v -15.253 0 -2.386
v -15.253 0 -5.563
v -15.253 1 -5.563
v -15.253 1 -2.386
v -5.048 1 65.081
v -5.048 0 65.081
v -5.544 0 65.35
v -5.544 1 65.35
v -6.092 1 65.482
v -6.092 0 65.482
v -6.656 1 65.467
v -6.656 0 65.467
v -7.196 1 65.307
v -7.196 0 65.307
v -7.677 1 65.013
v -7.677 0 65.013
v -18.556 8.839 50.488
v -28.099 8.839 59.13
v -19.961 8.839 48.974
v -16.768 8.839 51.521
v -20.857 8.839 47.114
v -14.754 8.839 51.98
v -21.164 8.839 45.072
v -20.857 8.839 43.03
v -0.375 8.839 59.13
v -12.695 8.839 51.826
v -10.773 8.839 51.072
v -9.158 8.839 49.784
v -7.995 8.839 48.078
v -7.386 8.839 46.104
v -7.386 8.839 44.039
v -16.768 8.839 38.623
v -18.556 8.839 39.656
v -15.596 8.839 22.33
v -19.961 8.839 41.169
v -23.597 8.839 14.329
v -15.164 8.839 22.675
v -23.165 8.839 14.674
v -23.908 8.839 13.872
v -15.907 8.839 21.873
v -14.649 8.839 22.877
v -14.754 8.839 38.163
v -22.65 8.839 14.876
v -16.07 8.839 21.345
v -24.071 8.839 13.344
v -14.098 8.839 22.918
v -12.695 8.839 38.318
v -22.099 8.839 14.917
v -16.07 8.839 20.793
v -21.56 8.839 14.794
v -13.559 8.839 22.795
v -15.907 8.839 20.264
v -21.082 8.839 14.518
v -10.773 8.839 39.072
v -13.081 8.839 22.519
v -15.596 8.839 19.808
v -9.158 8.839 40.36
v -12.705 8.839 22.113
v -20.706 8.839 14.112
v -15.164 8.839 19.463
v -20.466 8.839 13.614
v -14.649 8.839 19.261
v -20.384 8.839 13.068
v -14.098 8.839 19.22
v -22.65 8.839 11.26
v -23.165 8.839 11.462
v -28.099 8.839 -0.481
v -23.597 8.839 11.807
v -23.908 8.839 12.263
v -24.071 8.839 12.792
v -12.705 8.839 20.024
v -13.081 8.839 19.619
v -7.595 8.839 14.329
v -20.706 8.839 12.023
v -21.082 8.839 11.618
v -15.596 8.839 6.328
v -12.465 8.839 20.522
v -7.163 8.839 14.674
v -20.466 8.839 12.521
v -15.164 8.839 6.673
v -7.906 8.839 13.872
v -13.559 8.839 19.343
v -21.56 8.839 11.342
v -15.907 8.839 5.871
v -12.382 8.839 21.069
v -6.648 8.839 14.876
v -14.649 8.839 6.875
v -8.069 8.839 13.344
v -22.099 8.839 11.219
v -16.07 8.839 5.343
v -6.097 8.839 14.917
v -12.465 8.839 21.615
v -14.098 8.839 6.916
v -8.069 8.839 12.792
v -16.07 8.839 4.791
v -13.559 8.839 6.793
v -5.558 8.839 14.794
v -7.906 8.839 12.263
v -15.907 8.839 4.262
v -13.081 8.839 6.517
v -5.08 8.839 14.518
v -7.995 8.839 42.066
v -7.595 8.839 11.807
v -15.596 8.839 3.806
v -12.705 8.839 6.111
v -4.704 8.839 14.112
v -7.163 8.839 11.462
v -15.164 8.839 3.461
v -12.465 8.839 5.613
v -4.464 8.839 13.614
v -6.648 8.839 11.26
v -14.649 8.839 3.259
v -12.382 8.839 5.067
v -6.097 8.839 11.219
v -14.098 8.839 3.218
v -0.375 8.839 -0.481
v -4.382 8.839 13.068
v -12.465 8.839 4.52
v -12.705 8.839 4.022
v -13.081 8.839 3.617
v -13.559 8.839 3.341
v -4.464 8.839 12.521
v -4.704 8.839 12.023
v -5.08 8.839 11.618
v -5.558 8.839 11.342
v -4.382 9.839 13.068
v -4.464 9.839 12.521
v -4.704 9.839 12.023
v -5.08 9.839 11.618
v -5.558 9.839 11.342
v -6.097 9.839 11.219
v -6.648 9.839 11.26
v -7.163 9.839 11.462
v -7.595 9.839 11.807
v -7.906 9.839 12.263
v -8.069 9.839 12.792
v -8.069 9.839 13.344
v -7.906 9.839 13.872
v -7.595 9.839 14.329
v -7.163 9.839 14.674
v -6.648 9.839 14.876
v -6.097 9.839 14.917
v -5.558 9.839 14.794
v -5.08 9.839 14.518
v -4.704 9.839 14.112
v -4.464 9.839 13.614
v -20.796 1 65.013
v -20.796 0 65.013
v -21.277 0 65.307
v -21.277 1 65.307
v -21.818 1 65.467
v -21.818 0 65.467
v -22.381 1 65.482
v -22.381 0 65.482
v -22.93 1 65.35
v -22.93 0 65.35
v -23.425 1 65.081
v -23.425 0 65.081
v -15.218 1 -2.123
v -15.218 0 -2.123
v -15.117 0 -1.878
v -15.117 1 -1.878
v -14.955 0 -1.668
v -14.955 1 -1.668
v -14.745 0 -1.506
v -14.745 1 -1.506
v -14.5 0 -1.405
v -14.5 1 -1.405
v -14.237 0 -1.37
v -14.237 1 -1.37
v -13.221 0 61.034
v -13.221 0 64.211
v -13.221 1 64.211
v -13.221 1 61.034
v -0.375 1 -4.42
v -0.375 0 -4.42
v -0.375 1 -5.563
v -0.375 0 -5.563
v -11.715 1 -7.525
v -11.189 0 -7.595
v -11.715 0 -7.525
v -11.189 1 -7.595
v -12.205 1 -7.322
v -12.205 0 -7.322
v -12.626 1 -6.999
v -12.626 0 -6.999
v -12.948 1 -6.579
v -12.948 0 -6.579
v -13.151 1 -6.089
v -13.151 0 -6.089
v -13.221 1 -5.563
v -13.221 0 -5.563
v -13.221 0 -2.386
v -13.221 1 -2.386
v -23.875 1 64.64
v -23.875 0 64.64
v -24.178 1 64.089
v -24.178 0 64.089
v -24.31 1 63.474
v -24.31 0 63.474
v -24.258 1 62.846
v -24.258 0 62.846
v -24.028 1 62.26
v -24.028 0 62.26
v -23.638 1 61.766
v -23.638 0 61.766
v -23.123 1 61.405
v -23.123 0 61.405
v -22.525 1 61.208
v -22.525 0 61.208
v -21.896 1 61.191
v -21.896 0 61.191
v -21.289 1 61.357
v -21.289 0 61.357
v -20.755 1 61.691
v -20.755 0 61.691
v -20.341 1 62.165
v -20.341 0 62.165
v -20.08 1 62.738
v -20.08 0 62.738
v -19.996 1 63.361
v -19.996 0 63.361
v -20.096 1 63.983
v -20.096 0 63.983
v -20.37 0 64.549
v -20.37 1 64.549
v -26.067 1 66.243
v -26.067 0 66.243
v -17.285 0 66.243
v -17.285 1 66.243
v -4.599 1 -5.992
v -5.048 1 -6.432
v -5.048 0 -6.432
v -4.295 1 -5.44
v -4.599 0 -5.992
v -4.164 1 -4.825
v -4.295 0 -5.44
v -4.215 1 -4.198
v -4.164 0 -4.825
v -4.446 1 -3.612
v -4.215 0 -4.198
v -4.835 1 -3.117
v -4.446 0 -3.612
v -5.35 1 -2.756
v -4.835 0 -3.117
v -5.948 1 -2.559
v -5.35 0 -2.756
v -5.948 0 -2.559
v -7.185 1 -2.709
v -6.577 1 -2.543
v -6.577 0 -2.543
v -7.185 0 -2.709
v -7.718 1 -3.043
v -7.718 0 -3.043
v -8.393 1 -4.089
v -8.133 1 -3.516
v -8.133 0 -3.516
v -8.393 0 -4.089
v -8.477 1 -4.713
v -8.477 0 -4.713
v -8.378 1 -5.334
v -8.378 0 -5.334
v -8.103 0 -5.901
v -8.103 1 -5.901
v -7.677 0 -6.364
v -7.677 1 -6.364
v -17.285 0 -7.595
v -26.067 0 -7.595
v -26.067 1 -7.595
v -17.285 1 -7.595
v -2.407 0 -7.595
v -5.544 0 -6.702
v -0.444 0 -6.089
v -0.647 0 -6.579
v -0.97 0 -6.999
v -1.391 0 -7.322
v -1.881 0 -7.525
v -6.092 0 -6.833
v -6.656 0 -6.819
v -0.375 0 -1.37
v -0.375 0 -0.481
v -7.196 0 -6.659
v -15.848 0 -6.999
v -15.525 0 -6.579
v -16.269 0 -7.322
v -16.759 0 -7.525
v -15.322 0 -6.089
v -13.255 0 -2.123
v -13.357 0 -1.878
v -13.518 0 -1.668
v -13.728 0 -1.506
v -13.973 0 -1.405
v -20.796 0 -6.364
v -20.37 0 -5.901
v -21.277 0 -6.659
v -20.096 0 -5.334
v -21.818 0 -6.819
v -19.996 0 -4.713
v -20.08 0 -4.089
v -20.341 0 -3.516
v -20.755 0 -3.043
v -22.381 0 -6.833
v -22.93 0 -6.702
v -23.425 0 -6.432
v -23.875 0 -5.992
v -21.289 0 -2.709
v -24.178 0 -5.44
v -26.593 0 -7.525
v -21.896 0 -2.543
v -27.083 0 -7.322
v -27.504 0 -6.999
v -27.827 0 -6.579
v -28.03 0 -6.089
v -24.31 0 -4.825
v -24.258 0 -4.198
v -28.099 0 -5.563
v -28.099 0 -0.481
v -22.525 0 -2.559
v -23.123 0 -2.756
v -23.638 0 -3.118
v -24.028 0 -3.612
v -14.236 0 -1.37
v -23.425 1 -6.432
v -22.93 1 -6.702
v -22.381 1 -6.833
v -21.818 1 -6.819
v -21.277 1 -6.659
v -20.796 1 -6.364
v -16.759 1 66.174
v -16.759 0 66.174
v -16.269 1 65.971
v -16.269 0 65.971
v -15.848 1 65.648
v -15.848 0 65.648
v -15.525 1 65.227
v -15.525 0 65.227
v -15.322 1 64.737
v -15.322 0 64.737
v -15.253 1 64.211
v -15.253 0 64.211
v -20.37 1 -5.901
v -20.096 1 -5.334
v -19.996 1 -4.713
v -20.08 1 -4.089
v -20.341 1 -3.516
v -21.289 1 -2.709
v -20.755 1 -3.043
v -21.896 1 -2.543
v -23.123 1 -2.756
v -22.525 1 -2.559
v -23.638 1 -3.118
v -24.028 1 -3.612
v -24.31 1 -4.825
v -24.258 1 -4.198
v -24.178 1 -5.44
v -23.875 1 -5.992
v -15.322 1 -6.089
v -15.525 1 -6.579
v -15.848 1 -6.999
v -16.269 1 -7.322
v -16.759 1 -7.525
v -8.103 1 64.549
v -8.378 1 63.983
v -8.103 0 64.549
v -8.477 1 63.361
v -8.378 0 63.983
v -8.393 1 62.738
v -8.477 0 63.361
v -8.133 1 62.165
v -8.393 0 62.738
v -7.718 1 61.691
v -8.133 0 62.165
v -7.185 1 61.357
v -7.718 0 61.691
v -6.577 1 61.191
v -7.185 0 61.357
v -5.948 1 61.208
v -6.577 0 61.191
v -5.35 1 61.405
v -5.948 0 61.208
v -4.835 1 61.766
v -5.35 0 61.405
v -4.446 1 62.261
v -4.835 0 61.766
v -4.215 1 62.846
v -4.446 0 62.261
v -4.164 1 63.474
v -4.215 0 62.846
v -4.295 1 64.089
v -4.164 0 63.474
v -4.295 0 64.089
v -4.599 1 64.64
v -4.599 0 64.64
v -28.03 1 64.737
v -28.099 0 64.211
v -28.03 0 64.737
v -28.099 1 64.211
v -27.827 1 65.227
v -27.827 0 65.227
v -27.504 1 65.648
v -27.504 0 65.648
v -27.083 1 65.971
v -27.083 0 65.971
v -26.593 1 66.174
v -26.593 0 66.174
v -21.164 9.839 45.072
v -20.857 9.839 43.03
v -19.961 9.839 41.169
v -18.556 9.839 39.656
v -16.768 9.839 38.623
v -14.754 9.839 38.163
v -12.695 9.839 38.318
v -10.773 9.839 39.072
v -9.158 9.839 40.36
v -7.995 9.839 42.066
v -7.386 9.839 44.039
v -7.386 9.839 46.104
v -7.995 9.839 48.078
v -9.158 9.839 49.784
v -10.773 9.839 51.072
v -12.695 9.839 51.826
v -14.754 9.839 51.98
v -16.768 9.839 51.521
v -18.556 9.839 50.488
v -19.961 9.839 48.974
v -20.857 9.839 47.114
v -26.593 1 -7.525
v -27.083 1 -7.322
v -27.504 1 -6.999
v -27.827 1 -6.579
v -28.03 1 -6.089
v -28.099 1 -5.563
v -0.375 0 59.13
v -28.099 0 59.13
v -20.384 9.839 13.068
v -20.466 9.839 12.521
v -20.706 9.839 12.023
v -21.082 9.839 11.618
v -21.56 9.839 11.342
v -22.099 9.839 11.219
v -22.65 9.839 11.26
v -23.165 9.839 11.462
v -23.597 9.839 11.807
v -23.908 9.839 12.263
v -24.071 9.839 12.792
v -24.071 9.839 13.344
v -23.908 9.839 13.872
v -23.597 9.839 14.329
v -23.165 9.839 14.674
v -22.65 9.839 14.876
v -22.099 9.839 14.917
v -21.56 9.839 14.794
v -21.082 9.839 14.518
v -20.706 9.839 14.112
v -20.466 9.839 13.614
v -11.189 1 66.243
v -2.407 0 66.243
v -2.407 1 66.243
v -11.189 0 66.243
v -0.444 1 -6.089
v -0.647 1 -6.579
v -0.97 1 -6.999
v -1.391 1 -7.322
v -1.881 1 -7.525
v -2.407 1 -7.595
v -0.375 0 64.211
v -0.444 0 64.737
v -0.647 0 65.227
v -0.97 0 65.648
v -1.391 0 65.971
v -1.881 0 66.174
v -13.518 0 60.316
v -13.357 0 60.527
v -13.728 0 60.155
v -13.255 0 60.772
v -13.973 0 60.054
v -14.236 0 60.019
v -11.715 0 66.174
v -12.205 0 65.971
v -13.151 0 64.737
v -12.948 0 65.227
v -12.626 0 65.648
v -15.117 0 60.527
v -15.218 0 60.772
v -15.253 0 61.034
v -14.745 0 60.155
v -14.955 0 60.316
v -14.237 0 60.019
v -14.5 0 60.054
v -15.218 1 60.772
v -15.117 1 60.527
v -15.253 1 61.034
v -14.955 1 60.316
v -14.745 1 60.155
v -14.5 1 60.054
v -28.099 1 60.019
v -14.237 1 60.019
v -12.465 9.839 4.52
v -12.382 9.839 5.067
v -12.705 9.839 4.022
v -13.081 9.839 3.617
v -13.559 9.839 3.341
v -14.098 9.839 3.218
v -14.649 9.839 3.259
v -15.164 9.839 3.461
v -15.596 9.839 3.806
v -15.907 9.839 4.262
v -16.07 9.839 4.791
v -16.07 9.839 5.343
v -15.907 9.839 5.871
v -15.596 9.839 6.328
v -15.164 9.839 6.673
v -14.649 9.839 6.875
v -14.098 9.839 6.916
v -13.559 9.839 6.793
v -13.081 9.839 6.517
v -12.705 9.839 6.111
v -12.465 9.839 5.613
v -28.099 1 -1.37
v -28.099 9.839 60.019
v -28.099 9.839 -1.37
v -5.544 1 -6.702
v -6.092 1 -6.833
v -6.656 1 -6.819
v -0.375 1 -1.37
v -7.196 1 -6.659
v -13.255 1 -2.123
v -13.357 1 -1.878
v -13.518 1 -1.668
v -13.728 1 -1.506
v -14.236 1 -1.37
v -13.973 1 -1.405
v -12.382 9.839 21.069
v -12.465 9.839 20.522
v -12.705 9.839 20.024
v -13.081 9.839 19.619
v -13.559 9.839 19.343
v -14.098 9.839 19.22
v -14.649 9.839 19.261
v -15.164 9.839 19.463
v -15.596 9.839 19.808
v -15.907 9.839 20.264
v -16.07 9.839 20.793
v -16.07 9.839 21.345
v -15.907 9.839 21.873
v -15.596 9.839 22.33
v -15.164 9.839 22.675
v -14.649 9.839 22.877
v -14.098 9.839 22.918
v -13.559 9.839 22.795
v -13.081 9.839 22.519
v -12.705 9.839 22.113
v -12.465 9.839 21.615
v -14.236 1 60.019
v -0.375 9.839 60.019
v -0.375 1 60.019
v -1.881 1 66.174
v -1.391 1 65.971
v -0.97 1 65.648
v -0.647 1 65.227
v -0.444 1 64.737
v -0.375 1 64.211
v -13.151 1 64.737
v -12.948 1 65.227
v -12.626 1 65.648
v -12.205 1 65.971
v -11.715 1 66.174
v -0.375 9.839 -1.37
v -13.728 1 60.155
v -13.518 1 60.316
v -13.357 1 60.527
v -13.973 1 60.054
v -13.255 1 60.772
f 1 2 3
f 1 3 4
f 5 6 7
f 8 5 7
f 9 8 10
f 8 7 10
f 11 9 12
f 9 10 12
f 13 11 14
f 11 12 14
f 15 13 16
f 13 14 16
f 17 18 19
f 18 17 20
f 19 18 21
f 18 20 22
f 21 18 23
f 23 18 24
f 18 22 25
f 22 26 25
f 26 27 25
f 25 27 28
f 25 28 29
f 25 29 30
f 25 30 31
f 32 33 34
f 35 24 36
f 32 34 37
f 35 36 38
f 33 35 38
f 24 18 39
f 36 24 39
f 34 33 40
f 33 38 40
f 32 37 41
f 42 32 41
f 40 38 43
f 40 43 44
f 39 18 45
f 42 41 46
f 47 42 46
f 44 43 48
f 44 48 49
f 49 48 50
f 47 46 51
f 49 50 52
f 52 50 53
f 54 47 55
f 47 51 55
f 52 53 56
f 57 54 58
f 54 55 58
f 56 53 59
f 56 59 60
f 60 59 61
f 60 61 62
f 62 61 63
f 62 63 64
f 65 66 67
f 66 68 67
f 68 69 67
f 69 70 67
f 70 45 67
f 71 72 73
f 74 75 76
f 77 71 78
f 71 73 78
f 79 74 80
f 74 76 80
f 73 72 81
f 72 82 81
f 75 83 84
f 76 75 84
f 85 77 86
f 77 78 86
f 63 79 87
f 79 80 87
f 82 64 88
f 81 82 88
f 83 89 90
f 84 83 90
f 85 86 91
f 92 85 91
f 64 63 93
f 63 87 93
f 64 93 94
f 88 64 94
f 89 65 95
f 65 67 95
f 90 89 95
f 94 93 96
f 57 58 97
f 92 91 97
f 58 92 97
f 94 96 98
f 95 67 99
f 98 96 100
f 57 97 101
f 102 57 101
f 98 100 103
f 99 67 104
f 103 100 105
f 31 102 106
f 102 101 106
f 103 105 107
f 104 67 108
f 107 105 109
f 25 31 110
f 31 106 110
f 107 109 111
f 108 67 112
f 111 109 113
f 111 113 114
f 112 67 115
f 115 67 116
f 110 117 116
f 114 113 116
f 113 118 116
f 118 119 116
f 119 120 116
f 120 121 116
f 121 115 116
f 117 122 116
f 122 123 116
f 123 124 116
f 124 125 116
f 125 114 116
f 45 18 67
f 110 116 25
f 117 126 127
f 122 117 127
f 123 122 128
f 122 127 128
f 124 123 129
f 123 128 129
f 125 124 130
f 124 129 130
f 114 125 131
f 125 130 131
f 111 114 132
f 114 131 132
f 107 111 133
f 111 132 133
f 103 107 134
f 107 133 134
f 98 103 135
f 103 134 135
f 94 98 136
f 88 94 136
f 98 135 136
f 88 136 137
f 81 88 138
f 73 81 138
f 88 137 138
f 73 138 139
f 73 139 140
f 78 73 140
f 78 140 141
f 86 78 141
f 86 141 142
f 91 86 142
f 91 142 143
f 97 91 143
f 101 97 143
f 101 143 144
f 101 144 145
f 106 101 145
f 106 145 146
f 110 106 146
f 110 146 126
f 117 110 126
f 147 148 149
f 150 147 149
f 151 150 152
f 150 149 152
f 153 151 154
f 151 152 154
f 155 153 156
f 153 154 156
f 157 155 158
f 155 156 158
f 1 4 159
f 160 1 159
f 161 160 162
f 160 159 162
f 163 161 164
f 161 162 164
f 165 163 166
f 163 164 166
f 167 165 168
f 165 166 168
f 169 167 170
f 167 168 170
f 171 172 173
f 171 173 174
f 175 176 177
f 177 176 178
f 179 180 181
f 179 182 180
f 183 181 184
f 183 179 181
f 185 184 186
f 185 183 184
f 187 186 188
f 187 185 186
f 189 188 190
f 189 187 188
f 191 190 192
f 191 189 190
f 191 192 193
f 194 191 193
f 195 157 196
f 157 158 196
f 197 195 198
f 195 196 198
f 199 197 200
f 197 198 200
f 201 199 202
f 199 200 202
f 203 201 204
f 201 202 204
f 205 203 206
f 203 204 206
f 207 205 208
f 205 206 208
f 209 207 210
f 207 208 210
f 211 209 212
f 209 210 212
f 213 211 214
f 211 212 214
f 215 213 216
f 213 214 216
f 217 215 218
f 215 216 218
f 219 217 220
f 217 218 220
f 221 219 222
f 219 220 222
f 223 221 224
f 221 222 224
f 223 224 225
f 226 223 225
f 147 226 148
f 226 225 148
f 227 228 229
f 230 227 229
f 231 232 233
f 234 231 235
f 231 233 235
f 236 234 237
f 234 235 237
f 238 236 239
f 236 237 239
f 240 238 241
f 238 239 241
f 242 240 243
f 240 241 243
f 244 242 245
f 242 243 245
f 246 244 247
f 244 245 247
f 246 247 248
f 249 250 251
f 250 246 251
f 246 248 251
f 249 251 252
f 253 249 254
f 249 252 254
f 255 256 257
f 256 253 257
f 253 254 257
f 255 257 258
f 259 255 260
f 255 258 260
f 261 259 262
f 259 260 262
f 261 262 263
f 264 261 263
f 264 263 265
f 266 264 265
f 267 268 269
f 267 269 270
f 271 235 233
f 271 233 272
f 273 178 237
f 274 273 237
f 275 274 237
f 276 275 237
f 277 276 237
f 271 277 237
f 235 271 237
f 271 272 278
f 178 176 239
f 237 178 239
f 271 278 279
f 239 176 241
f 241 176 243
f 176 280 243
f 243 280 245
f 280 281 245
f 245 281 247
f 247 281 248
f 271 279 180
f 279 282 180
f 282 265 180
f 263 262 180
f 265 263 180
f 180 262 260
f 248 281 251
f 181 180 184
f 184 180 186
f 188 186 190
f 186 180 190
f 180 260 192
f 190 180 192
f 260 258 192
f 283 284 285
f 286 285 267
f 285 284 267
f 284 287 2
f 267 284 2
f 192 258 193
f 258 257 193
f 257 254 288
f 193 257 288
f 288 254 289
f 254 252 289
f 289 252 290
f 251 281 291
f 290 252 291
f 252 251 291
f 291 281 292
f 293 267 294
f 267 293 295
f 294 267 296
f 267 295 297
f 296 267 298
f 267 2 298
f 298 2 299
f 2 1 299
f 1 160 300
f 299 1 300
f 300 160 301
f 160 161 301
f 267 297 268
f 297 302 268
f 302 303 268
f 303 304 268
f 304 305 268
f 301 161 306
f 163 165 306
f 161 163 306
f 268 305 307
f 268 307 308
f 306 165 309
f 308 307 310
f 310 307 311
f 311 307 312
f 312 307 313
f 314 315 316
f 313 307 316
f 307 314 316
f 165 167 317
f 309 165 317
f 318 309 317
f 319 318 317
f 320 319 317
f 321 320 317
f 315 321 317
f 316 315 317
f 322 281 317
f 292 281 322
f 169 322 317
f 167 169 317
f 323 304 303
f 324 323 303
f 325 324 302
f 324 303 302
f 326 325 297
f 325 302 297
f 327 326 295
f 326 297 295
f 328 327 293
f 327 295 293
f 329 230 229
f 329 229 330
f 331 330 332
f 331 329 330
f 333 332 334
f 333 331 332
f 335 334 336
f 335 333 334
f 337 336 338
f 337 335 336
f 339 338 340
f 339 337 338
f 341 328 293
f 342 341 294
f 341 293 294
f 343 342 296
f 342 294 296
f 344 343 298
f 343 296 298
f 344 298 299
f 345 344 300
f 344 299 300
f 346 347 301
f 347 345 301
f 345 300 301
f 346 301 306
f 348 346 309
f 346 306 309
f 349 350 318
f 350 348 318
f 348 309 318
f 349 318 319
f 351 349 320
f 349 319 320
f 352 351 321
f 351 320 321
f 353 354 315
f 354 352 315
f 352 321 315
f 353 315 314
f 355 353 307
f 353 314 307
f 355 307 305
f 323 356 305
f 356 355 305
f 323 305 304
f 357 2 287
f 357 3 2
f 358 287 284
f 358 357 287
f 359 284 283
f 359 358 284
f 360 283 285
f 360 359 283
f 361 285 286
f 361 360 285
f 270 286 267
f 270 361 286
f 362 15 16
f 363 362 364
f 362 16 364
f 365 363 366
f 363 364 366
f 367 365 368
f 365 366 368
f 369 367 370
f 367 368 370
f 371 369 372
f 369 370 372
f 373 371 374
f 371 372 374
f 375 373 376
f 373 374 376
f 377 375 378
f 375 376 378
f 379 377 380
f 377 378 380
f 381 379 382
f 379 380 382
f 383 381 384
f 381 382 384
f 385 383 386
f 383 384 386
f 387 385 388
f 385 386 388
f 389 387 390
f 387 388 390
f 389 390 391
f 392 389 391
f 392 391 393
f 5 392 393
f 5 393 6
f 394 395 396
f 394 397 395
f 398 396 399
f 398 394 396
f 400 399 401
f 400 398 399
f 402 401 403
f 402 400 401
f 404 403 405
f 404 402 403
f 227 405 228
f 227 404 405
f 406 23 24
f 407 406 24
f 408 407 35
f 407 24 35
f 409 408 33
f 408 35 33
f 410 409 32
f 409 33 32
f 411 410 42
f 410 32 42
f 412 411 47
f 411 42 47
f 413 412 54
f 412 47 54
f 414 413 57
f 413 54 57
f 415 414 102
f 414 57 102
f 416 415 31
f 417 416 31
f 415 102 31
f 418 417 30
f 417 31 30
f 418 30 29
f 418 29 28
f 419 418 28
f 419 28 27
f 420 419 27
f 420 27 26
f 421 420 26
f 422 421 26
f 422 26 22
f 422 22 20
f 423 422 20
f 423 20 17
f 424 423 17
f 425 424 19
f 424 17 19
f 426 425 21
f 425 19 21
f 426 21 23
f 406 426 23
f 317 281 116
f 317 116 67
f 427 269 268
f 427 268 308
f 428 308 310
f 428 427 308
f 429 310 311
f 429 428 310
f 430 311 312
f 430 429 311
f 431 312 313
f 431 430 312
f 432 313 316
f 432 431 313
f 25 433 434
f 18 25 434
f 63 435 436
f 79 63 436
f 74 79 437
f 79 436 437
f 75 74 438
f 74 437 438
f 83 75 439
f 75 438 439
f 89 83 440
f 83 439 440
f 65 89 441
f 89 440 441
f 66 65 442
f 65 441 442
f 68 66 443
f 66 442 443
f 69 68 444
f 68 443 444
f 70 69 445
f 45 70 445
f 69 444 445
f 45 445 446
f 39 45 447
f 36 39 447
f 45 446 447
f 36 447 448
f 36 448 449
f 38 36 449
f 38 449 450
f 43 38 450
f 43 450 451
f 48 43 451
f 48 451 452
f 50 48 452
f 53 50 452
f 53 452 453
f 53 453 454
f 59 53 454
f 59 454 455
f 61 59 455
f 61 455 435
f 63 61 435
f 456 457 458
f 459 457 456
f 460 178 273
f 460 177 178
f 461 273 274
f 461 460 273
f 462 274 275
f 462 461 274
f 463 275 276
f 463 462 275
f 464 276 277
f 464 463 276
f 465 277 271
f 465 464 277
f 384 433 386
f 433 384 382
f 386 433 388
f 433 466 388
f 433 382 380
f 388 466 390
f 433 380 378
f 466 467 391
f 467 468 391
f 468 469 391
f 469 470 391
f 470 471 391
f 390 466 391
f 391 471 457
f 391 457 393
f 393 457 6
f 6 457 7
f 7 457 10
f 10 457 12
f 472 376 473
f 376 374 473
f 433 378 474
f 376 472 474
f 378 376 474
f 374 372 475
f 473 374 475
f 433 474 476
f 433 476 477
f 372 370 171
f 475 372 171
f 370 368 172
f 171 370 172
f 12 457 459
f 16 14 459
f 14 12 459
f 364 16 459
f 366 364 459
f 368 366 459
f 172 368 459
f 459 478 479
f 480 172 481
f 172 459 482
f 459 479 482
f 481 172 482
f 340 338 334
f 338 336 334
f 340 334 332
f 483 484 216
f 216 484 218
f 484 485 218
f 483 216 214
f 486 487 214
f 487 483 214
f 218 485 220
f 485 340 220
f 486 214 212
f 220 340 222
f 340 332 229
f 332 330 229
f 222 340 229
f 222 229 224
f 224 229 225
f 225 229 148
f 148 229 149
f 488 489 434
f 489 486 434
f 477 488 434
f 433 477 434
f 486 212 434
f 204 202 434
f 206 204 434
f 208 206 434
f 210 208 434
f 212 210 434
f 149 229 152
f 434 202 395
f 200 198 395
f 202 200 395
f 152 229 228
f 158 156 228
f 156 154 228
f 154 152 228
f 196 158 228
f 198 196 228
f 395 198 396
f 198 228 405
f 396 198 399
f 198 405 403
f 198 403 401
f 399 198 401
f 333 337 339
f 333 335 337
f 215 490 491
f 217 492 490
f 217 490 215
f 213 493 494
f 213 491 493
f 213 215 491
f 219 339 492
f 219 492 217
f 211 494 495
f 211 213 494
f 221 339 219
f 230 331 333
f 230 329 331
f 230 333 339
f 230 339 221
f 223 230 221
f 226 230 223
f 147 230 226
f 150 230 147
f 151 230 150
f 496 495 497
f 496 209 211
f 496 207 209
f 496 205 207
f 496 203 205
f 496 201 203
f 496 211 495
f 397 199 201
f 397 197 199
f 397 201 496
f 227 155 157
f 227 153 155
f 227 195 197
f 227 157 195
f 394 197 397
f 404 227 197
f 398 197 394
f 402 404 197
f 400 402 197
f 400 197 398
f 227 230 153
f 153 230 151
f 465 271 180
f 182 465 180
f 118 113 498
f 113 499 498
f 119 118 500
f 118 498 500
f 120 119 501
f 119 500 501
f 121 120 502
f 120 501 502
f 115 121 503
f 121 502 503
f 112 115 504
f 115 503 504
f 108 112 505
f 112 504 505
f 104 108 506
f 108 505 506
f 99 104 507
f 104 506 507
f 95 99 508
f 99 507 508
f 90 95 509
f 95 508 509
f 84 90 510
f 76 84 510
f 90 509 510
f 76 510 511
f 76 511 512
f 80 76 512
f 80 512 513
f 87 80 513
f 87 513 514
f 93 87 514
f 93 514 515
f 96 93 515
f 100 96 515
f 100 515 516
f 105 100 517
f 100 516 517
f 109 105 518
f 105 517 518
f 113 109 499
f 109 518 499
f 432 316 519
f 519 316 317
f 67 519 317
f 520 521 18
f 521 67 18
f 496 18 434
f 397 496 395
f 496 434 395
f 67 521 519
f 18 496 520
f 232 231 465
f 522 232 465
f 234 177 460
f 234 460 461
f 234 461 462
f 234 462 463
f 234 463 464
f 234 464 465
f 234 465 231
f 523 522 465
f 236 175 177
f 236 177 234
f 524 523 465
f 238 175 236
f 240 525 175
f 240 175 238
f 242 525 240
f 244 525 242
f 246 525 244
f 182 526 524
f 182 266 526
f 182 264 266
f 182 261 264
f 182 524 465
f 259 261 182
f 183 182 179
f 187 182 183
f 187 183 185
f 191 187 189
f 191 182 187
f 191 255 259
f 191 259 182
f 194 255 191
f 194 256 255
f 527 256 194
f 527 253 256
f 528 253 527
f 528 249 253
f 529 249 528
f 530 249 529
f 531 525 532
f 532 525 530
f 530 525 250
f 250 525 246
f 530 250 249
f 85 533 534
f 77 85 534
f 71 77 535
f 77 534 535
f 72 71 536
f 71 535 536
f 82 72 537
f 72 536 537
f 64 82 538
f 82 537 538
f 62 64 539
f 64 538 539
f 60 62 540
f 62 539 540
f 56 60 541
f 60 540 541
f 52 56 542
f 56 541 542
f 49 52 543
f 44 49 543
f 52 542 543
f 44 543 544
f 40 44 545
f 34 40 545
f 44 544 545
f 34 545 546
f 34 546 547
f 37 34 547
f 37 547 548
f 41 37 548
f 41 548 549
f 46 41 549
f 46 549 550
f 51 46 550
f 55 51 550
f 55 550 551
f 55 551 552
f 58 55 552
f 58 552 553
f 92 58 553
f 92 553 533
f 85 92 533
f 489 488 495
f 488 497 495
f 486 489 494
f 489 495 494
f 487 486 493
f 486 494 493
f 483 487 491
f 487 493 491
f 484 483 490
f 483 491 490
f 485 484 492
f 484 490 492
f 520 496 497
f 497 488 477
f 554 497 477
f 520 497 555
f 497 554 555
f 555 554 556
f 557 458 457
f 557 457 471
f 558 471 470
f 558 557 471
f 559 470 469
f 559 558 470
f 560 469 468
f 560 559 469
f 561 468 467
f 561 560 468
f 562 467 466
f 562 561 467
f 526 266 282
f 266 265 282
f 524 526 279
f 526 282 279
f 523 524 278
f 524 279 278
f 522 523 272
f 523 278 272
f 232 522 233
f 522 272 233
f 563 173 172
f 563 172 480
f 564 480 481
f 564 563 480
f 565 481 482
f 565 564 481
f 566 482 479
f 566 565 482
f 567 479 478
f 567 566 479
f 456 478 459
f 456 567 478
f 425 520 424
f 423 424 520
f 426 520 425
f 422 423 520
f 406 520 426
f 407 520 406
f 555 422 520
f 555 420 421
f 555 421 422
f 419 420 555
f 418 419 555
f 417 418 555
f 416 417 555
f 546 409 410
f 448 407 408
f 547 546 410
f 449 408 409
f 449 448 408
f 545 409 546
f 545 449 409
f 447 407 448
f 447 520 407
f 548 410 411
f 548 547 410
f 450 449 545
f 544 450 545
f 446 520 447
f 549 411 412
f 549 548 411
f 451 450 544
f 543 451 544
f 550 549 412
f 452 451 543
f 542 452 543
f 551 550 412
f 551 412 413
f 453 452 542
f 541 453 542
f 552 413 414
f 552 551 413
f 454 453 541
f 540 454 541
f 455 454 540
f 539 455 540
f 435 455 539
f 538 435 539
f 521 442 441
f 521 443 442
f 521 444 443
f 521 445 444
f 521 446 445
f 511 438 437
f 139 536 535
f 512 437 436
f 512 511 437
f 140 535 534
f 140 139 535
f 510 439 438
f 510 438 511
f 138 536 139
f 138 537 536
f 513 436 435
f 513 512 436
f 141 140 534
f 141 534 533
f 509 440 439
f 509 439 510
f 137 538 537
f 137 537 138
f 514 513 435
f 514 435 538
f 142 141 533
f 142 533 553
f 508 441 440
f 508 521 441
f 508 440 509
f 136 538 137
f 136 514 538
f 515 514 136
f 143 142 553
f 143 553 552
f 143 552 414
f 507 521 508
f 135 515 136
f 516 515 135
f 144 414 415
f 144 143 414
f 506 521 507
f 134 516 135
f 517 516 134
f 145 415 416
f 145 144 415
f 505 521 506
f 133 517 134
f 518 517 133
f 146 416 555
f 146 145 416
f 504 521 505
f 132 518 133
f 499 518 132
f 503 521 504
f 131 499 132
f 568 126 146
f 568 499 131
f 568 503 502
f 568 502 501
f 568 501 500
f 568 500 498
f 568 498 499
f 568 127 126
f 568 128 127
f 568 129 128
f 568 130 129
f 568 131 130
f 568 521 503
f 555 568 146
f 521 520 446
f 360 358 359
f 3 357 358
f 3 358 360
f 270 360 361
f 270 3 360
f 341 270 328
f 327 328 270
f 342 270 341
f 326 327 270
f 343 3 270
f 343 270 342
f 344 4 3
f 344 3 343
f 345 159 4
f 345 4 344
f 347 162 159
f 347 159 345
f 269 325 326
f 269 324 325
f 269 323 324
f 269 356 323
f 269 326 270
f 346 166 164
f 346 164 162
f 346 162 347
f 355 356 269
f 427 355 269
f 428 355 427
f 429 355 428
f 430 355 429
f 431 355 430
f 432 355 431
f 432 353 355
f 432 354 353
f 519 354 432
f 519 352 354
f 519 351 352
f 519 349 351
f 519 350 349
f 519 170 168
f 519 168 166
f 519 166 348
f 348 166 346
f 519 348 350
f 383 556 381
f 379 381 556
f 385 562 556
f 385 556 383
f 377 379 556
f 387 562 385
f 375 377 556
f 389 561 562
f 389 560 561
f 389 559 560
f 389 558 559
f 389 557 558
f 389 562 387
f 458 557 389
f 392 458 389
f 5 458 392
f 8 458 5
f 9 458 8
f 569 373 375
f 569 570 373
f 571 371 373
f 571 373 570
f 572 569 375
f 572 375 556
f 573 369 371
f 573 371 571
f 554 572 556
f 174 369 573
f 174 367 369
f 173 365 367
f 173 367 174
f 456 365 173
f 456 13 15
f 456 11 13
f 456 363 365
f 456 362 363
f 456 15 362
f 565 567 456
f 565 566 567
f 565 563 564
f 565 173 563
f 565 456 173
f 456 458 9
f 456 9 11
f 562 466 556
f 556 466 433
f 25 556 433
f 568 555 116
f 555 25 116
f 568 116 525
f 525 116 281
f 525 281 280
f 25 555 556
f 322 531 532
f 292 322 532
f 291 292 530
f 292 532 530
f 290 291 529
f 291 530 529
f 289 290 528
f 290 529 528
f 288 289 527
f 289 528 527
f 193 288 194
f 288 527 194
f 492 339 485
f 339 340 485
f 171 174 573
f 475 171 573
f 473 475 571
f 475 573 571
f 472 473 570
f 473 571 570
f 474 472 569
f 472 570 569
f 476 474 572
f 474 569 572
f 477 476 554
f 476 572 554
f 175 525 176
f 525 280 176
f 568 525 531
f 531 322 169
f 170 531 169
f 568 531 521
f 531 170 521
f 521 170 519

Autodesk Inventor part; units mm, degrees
ref_plane "YZ Plane" through (0, 0, 0) normal (1, 0, 0) x (0, 1, 0)
ref_plane "XZ Plane" through (0, 0, 0) normal (0, 1, 0) x (-1, 0, 0)
ref_plane "XY Plane" through (0, 0, 0) normal (0, 0, 1) x (1, 0, 0)
sketch "Sketch1" plane through (0, 0, 0) normal (0, 1, 0) x (-1, 0, 0)
  line L0 (0.3746, 1.6788) -> (0.3747, -4.4196)
  line L1 (3.5497, -7.5946) -> (5.0483, -7.5946)
  arc A0 (7.6772, -6.364) -> (5.0483, -6.4323) centre (6.3183, -4.6863) ccw
  line L2 (7.6772, -7.5946) -> (20.7963, -7.5946)
  arc A1 (23.4251, -6.4323) -> (20.7962, -6.364) centre (22.1552, -4.6863) ccw
  line L3 (23.4252, -7.5946) -> (24.9238, -7.5946)
  line L4 (20.7963, 66.2432) -> (7.6772, 66.2432)
  arc A2 (5.0483, 65.0809) -> (7.6772, 65.0126) centre (6.3183, 63.3349) ccw
  line L5 (5.0483, 66.2432) -> (3.5496, 66.2432)
  line L6 (24.9237, 66.2432) -> (23.4252, 66.2432)
  arc A3 (20.7962, 65.0126) -> (23.4251, 65.0809) centre (22.1552, 63.3349) ccw
  circle A4 centre (14.2367, 45.0719) radius 6.9278
  arc A5 (1.9876, 15.9067) -> (5.1626, 12.7318) centre (5.1626, 15.9067) ccw
  line L7 (5.1626, 12.7318) -> (23.3109, 12.7318)
  arc A6 (23.3109, 12.7318) -> (26.4859, 15.9068) centre (23.3109, 15.9068) ccw
  line L8 (26.4859, 15.9068) -> (26.4859, 45.1707)
  arc A7 (26.4859, 45.1707) -> (1.9876, 45.1707) centre (14.2367, 45.0719) ccw
  line L9 (1.9876, 45.1707) -> (1.9876, 15.9067)
  arc A8 (27.813, 45.1759) -> (0.6604, 45.1759) centre (14.2367, 45.0719) ccw
  circle A9 centre (14.2367, 45.0719) radius 6.9278
  line L10 (0.3746, 66.2432) -> (13.2207, 66.2432)
  line L11 (13.2207, 66.2432) -> (13.2207, 60.019)
  line L12 (13.2207, 60.019) -> (0.3746, 60.019)
  line L13 (0.3746, 60.019) -> (0.3746, 66.2432)
  line L14 (0.3746, 60.019) -> (13.2207, 60.019)
  line L15 (13.2207, 60.019) -> (13.2207, 59.1663)
  line L16 (13.2207, 59.1663) -> (0.3746, 59.1663)
  line L17 (0.3746, 59.1663) -> (0.3746, 60.019)
  line L18 (14.2367, 45.0719) -> (14.2367, 66.2432)
  line L19 (28.0988, 66.2432) -> (15.2527, 66.2432)
  line L20 (15.2527, 66.2432) -> (15.2527, 60.019)
  line L21 (28.0988, 60.019) -> (28.0988, 66.2432)
  line L22 (28.0988, 60.019) -> (15.2527, 60.019)
  line L23 (15.2527, 60.019) -> (15.2527, 59.1663)
  line L24 (15.2527, 59.1663) -> (28.0988, 59.1663)
  line L25 (28.0988, 59.1663) -> (28.0988, 60.019)
  circle A10 centre (6.3183, 63.3349) radius 2.159
  circle A11 centre (22.1552, 63.3349) radius 2.159
  line L26 (0.3746, 66.2432) -> (0.3746, -7.5946)
  line L27 (0.3746, 29.3243) -> (28.0988, 29.3243)
  line L28 (20.7963, -7.5946) -> (7.6772, -7.5946)
  arc A12 (7.6772, -6.364) -> (5.0483, -6.4323) centre (6.3182, -4.6863) ccw
  line L29 (5.0483, -7.5946) -> (3.5497, -7.5946)
  line L30 (24.9238, -7.5946) -> (23.4252, -7.5946)
  arc A13 (23.4251, -6.4323) -> (20.7962, -6.364) centre (22.1551, -4.6863) ccw
  line L31 (0.3746, -7.5946) -> (13.2207, -7.5946)
  line L32 (13.2207, -7.5946) -> (13.2207, -1.3704)
  line L33 (13.2207, -1.3704) -> (0.3746, -1.3704)
  line L34 (0.3746, -1.3704) -> (0.3746, -7.5946)
  line L35 (0.3746, -1.3704) -> (13.2207, -1.3704)
  line L36 (13.2207, -1.3704) -> (13.2207, -0.5177)
  line L37 (13.2207, -0.5177) -> (0.3746, -0.5177)
  line L38 (0.3746, -0.5177) -> (0.3746, -1.3704)
  line L39 (28.0988, -1.3704) -> (28.0988, -7.5946)
  line L40 (28.0988, -7.5946) -> (15.2527, -7.5946)
  line L41 (15.2527, -7.5946) -> (15.2527, -1.3704)
  line L42 (28.0988, -1.3704) -> (15.2527, -1.3704)
  line L43 (15.2527, -0.5177) -> (28.0988, -0.5177)
  line L44 (15.2527, -1.3704) -> (15.2527, -0.5177)
  line L45 (28.0988, -0.5177) -> (28.0988, -1.3704)
  circle A14 centre (6.3182, -4.6863) radius 2.159
  circle A15 centre (22.1551, -4.6863) radius 2.159
  line L46 (28.0988, -7.5946) -> (15.2527, -7.5946)
  line L47 (15.2527, -7.5946) -> (15.2527, -1.3704)
  line L48 (15.2527, -1.3704) -> (28.0988, -1.3704)
  line L49 (28.0988, -1.3704) -> (28.0988, -7.5946)
  line L50 (13.2207, -7.5946) -> (0.3746, -7.5946)
  line L51 (0.3746, -7.5946) -> (0.3746, -1.3704)
  line L52 (0.3746, -1.3704) -> (13.2207, -1.3704)
  line L53 (13.2207, -1.3704) -> (13.2207, -7.5946)
  line L54 (28.0988, 66.2432) -> (15.2527, 66.2432)
  line L55 (15.2527, 66.2432) -> (15.2527, 60.019)
  line L56 (15.2527, 60.019) -> (28.0988, 60.019)
  line L57 (28.0988, 60.019) -> (28.0988, 66.2432)
  point P0 (0, 0)
  point P1 (0, 20.6785)
  point P2 (14.2367, -7.5946)
extrude "Extrusion1" add sketch "Sketch1" along normal blind 1 contours L41 L42 L39 L40 L3 L2 | L4 L19 L6 L21 L22 L20 | L33 L32 L2 L31 L1 L26 L0 | L13 L10 L5 L4 L11 L12
sketch "Sketch2" plane through (0, 0, 0) normal (0, -1, 0) x (1, 0, 0)
  circle A0 centre (-22.1552, 63.3349) radius 2.159 projected
  line L0 (-28.0988, 66.2432) -> (-15.2527, 66.2432) projected
  line L1 (-28.0988, 60.019) -> (-28.0988, 66.2432) projected
  line L2 (-15.2527, 60.019) -> (-28.0988, 60.019) projected
  line L3 (-15.2527, 66.2432) -> (-15.2527, 60.019) projected
  circle A1 centre (-6.3183, 63.3349) radius 2.159 projected
  line L4 (-0.3746, 66.2432) -> (-0.3746, 60.019) projected
  line L5 (-13.2207, 66.2432) -> (-0.3746, 66.2432) projected
  line L6 (-13.2207, 60.019) -> (-13.2207, 66.2432) projected
  line L7 (-0.3746, 60.019) -> (-13.2207, 60.019) projected
  circle A2 centre (-22.1551, -4.6863) radius 2.159 projected
  line L8 (-15.2527, -1.3704) -> (-15.2527, -7.5946) projected
  line L9 (-28.0988, -1.3704) -> (-15.2527, -1.3704) projected
  line L10 (-28.0988, -7.5946) -> (-28.0988, -1.3704) projected
  line L11 (-15.2527, -7.5946) -> (-28.0988, -7.5946) projected
  line L12 (-28.0988, 60.019) -> (-0.3746, 60.019)
  line L13 (-0.3746, 60.019) -> (-0.3746, 59.13)
  line L14 (-0.3746, 59.13) -> (-28.0988, 59.13)
  line L15 (-28.0988, 59.13) -> (-28.0988, 60.019)
  line L16 (-28.0988, -1.3704) -> (-0.3746, -1.3704)
  line L17 (-0.3746, -1.3704) -> (-0.3746, -0.4814)
  line L18 (-0.3746, -0.4814) -> (-28.0988, -0.4814)
  line L19 (-28.0988, -0.4814) -> (-28.0988, -1.3704)
  point P0 (0, 0)
  dimension "d2" = 0.889
  dimension "d3" = 0.889
extrude "Extrusion2" add sketch "Sketch2" against normal blind 8.8392 contours L2 L12 L7 L13 L14 L15 | L9 L19 L18 L17 L16
sketch "Sketch3" plane through (0, 8.8392, 0) normal (0, 1, 0) x (1, 0, 0)
  line L0 (-0.3746, 1.3704) -> (-28.0988, 1.3704)
  line L1 (-28.0988, 1.3704) -> (-28.0988, -60.019)
  line L2 (-28.0988, -60.019) -> (-0.3746, -60.019)
  line L3 (-0.3746, -60.019) -> (-0.3746, 1.3704)
  point P0 (0, 0)
extrude "Extrusion3" add sketch "Sketch3" along normal blind 1
fillet "Fillet1" radius 2.032 8 edges at (-28.0988, 0.5, 66.2432) (-15.2527, 0.5, 66.2432) (-13.2207, 0.5, 66.2432) (-0.3746, 0.5, 66.2432) (-0.3746, 0.5, -7.5946) (-13.2207, 0.5, -7.5946) (-15.2527, 0.5, -7.5946) (-28.0988, 0.5, -7.5946)
fillet "Fillet2" radius 1.016 4 edges at (-13.2207, 0.5, -1.3704) (-15.2527, 0.5, -1.3704) (-15.2527, 0.5, 60.019) (-13.2207, 0.5, 60.019)
extrude "Extrusion4" cut sketch "Sketch1" along normal blind 127 contours A4
sketch "Sketch4" plane through (0, 9.8392, 0) normal (0, 1, 0) x (1, 0, 0)
  circle A0 centre (-14.2367, -45.0719) radius 6.9278 projected
  line L0 (-28.0988, 1.3704) -> (-28.0988, -60.019) projected
  circle A1 centre (-14.2367, -45.0719) radius 4.0005
  circle A2 centre (-14.2367, -13.0679) radius 4.0005
  line L1 (-14.2367, -13.0679) -> (-14.2367, -5.0669)
  circle A3 centre (-14.2367, -5.0669) radius 1.8542
  circle A4 centre (-22.2377, -13.0679) radius 1.8542
  circle A5 centre (-14.2367, -21.0689) radius 1.8542
  circle A6 centre (-6.2357, -13.0679) radius 1.8542
  point P0 (0, 0)
  dimension "d12" = 8.001
  dimension "d15" = 32.004
  dimension "d20" = 8.001
  dimension "d21" = 3.7084
  dimension "d24" = 360
extrude "Extrusion5" cut sketch "Sketch4" against normal blind 127 contours A3 | A4 | A5 | A6
properties part number "Quarter-Scale Servo Front Mount Bracket"
